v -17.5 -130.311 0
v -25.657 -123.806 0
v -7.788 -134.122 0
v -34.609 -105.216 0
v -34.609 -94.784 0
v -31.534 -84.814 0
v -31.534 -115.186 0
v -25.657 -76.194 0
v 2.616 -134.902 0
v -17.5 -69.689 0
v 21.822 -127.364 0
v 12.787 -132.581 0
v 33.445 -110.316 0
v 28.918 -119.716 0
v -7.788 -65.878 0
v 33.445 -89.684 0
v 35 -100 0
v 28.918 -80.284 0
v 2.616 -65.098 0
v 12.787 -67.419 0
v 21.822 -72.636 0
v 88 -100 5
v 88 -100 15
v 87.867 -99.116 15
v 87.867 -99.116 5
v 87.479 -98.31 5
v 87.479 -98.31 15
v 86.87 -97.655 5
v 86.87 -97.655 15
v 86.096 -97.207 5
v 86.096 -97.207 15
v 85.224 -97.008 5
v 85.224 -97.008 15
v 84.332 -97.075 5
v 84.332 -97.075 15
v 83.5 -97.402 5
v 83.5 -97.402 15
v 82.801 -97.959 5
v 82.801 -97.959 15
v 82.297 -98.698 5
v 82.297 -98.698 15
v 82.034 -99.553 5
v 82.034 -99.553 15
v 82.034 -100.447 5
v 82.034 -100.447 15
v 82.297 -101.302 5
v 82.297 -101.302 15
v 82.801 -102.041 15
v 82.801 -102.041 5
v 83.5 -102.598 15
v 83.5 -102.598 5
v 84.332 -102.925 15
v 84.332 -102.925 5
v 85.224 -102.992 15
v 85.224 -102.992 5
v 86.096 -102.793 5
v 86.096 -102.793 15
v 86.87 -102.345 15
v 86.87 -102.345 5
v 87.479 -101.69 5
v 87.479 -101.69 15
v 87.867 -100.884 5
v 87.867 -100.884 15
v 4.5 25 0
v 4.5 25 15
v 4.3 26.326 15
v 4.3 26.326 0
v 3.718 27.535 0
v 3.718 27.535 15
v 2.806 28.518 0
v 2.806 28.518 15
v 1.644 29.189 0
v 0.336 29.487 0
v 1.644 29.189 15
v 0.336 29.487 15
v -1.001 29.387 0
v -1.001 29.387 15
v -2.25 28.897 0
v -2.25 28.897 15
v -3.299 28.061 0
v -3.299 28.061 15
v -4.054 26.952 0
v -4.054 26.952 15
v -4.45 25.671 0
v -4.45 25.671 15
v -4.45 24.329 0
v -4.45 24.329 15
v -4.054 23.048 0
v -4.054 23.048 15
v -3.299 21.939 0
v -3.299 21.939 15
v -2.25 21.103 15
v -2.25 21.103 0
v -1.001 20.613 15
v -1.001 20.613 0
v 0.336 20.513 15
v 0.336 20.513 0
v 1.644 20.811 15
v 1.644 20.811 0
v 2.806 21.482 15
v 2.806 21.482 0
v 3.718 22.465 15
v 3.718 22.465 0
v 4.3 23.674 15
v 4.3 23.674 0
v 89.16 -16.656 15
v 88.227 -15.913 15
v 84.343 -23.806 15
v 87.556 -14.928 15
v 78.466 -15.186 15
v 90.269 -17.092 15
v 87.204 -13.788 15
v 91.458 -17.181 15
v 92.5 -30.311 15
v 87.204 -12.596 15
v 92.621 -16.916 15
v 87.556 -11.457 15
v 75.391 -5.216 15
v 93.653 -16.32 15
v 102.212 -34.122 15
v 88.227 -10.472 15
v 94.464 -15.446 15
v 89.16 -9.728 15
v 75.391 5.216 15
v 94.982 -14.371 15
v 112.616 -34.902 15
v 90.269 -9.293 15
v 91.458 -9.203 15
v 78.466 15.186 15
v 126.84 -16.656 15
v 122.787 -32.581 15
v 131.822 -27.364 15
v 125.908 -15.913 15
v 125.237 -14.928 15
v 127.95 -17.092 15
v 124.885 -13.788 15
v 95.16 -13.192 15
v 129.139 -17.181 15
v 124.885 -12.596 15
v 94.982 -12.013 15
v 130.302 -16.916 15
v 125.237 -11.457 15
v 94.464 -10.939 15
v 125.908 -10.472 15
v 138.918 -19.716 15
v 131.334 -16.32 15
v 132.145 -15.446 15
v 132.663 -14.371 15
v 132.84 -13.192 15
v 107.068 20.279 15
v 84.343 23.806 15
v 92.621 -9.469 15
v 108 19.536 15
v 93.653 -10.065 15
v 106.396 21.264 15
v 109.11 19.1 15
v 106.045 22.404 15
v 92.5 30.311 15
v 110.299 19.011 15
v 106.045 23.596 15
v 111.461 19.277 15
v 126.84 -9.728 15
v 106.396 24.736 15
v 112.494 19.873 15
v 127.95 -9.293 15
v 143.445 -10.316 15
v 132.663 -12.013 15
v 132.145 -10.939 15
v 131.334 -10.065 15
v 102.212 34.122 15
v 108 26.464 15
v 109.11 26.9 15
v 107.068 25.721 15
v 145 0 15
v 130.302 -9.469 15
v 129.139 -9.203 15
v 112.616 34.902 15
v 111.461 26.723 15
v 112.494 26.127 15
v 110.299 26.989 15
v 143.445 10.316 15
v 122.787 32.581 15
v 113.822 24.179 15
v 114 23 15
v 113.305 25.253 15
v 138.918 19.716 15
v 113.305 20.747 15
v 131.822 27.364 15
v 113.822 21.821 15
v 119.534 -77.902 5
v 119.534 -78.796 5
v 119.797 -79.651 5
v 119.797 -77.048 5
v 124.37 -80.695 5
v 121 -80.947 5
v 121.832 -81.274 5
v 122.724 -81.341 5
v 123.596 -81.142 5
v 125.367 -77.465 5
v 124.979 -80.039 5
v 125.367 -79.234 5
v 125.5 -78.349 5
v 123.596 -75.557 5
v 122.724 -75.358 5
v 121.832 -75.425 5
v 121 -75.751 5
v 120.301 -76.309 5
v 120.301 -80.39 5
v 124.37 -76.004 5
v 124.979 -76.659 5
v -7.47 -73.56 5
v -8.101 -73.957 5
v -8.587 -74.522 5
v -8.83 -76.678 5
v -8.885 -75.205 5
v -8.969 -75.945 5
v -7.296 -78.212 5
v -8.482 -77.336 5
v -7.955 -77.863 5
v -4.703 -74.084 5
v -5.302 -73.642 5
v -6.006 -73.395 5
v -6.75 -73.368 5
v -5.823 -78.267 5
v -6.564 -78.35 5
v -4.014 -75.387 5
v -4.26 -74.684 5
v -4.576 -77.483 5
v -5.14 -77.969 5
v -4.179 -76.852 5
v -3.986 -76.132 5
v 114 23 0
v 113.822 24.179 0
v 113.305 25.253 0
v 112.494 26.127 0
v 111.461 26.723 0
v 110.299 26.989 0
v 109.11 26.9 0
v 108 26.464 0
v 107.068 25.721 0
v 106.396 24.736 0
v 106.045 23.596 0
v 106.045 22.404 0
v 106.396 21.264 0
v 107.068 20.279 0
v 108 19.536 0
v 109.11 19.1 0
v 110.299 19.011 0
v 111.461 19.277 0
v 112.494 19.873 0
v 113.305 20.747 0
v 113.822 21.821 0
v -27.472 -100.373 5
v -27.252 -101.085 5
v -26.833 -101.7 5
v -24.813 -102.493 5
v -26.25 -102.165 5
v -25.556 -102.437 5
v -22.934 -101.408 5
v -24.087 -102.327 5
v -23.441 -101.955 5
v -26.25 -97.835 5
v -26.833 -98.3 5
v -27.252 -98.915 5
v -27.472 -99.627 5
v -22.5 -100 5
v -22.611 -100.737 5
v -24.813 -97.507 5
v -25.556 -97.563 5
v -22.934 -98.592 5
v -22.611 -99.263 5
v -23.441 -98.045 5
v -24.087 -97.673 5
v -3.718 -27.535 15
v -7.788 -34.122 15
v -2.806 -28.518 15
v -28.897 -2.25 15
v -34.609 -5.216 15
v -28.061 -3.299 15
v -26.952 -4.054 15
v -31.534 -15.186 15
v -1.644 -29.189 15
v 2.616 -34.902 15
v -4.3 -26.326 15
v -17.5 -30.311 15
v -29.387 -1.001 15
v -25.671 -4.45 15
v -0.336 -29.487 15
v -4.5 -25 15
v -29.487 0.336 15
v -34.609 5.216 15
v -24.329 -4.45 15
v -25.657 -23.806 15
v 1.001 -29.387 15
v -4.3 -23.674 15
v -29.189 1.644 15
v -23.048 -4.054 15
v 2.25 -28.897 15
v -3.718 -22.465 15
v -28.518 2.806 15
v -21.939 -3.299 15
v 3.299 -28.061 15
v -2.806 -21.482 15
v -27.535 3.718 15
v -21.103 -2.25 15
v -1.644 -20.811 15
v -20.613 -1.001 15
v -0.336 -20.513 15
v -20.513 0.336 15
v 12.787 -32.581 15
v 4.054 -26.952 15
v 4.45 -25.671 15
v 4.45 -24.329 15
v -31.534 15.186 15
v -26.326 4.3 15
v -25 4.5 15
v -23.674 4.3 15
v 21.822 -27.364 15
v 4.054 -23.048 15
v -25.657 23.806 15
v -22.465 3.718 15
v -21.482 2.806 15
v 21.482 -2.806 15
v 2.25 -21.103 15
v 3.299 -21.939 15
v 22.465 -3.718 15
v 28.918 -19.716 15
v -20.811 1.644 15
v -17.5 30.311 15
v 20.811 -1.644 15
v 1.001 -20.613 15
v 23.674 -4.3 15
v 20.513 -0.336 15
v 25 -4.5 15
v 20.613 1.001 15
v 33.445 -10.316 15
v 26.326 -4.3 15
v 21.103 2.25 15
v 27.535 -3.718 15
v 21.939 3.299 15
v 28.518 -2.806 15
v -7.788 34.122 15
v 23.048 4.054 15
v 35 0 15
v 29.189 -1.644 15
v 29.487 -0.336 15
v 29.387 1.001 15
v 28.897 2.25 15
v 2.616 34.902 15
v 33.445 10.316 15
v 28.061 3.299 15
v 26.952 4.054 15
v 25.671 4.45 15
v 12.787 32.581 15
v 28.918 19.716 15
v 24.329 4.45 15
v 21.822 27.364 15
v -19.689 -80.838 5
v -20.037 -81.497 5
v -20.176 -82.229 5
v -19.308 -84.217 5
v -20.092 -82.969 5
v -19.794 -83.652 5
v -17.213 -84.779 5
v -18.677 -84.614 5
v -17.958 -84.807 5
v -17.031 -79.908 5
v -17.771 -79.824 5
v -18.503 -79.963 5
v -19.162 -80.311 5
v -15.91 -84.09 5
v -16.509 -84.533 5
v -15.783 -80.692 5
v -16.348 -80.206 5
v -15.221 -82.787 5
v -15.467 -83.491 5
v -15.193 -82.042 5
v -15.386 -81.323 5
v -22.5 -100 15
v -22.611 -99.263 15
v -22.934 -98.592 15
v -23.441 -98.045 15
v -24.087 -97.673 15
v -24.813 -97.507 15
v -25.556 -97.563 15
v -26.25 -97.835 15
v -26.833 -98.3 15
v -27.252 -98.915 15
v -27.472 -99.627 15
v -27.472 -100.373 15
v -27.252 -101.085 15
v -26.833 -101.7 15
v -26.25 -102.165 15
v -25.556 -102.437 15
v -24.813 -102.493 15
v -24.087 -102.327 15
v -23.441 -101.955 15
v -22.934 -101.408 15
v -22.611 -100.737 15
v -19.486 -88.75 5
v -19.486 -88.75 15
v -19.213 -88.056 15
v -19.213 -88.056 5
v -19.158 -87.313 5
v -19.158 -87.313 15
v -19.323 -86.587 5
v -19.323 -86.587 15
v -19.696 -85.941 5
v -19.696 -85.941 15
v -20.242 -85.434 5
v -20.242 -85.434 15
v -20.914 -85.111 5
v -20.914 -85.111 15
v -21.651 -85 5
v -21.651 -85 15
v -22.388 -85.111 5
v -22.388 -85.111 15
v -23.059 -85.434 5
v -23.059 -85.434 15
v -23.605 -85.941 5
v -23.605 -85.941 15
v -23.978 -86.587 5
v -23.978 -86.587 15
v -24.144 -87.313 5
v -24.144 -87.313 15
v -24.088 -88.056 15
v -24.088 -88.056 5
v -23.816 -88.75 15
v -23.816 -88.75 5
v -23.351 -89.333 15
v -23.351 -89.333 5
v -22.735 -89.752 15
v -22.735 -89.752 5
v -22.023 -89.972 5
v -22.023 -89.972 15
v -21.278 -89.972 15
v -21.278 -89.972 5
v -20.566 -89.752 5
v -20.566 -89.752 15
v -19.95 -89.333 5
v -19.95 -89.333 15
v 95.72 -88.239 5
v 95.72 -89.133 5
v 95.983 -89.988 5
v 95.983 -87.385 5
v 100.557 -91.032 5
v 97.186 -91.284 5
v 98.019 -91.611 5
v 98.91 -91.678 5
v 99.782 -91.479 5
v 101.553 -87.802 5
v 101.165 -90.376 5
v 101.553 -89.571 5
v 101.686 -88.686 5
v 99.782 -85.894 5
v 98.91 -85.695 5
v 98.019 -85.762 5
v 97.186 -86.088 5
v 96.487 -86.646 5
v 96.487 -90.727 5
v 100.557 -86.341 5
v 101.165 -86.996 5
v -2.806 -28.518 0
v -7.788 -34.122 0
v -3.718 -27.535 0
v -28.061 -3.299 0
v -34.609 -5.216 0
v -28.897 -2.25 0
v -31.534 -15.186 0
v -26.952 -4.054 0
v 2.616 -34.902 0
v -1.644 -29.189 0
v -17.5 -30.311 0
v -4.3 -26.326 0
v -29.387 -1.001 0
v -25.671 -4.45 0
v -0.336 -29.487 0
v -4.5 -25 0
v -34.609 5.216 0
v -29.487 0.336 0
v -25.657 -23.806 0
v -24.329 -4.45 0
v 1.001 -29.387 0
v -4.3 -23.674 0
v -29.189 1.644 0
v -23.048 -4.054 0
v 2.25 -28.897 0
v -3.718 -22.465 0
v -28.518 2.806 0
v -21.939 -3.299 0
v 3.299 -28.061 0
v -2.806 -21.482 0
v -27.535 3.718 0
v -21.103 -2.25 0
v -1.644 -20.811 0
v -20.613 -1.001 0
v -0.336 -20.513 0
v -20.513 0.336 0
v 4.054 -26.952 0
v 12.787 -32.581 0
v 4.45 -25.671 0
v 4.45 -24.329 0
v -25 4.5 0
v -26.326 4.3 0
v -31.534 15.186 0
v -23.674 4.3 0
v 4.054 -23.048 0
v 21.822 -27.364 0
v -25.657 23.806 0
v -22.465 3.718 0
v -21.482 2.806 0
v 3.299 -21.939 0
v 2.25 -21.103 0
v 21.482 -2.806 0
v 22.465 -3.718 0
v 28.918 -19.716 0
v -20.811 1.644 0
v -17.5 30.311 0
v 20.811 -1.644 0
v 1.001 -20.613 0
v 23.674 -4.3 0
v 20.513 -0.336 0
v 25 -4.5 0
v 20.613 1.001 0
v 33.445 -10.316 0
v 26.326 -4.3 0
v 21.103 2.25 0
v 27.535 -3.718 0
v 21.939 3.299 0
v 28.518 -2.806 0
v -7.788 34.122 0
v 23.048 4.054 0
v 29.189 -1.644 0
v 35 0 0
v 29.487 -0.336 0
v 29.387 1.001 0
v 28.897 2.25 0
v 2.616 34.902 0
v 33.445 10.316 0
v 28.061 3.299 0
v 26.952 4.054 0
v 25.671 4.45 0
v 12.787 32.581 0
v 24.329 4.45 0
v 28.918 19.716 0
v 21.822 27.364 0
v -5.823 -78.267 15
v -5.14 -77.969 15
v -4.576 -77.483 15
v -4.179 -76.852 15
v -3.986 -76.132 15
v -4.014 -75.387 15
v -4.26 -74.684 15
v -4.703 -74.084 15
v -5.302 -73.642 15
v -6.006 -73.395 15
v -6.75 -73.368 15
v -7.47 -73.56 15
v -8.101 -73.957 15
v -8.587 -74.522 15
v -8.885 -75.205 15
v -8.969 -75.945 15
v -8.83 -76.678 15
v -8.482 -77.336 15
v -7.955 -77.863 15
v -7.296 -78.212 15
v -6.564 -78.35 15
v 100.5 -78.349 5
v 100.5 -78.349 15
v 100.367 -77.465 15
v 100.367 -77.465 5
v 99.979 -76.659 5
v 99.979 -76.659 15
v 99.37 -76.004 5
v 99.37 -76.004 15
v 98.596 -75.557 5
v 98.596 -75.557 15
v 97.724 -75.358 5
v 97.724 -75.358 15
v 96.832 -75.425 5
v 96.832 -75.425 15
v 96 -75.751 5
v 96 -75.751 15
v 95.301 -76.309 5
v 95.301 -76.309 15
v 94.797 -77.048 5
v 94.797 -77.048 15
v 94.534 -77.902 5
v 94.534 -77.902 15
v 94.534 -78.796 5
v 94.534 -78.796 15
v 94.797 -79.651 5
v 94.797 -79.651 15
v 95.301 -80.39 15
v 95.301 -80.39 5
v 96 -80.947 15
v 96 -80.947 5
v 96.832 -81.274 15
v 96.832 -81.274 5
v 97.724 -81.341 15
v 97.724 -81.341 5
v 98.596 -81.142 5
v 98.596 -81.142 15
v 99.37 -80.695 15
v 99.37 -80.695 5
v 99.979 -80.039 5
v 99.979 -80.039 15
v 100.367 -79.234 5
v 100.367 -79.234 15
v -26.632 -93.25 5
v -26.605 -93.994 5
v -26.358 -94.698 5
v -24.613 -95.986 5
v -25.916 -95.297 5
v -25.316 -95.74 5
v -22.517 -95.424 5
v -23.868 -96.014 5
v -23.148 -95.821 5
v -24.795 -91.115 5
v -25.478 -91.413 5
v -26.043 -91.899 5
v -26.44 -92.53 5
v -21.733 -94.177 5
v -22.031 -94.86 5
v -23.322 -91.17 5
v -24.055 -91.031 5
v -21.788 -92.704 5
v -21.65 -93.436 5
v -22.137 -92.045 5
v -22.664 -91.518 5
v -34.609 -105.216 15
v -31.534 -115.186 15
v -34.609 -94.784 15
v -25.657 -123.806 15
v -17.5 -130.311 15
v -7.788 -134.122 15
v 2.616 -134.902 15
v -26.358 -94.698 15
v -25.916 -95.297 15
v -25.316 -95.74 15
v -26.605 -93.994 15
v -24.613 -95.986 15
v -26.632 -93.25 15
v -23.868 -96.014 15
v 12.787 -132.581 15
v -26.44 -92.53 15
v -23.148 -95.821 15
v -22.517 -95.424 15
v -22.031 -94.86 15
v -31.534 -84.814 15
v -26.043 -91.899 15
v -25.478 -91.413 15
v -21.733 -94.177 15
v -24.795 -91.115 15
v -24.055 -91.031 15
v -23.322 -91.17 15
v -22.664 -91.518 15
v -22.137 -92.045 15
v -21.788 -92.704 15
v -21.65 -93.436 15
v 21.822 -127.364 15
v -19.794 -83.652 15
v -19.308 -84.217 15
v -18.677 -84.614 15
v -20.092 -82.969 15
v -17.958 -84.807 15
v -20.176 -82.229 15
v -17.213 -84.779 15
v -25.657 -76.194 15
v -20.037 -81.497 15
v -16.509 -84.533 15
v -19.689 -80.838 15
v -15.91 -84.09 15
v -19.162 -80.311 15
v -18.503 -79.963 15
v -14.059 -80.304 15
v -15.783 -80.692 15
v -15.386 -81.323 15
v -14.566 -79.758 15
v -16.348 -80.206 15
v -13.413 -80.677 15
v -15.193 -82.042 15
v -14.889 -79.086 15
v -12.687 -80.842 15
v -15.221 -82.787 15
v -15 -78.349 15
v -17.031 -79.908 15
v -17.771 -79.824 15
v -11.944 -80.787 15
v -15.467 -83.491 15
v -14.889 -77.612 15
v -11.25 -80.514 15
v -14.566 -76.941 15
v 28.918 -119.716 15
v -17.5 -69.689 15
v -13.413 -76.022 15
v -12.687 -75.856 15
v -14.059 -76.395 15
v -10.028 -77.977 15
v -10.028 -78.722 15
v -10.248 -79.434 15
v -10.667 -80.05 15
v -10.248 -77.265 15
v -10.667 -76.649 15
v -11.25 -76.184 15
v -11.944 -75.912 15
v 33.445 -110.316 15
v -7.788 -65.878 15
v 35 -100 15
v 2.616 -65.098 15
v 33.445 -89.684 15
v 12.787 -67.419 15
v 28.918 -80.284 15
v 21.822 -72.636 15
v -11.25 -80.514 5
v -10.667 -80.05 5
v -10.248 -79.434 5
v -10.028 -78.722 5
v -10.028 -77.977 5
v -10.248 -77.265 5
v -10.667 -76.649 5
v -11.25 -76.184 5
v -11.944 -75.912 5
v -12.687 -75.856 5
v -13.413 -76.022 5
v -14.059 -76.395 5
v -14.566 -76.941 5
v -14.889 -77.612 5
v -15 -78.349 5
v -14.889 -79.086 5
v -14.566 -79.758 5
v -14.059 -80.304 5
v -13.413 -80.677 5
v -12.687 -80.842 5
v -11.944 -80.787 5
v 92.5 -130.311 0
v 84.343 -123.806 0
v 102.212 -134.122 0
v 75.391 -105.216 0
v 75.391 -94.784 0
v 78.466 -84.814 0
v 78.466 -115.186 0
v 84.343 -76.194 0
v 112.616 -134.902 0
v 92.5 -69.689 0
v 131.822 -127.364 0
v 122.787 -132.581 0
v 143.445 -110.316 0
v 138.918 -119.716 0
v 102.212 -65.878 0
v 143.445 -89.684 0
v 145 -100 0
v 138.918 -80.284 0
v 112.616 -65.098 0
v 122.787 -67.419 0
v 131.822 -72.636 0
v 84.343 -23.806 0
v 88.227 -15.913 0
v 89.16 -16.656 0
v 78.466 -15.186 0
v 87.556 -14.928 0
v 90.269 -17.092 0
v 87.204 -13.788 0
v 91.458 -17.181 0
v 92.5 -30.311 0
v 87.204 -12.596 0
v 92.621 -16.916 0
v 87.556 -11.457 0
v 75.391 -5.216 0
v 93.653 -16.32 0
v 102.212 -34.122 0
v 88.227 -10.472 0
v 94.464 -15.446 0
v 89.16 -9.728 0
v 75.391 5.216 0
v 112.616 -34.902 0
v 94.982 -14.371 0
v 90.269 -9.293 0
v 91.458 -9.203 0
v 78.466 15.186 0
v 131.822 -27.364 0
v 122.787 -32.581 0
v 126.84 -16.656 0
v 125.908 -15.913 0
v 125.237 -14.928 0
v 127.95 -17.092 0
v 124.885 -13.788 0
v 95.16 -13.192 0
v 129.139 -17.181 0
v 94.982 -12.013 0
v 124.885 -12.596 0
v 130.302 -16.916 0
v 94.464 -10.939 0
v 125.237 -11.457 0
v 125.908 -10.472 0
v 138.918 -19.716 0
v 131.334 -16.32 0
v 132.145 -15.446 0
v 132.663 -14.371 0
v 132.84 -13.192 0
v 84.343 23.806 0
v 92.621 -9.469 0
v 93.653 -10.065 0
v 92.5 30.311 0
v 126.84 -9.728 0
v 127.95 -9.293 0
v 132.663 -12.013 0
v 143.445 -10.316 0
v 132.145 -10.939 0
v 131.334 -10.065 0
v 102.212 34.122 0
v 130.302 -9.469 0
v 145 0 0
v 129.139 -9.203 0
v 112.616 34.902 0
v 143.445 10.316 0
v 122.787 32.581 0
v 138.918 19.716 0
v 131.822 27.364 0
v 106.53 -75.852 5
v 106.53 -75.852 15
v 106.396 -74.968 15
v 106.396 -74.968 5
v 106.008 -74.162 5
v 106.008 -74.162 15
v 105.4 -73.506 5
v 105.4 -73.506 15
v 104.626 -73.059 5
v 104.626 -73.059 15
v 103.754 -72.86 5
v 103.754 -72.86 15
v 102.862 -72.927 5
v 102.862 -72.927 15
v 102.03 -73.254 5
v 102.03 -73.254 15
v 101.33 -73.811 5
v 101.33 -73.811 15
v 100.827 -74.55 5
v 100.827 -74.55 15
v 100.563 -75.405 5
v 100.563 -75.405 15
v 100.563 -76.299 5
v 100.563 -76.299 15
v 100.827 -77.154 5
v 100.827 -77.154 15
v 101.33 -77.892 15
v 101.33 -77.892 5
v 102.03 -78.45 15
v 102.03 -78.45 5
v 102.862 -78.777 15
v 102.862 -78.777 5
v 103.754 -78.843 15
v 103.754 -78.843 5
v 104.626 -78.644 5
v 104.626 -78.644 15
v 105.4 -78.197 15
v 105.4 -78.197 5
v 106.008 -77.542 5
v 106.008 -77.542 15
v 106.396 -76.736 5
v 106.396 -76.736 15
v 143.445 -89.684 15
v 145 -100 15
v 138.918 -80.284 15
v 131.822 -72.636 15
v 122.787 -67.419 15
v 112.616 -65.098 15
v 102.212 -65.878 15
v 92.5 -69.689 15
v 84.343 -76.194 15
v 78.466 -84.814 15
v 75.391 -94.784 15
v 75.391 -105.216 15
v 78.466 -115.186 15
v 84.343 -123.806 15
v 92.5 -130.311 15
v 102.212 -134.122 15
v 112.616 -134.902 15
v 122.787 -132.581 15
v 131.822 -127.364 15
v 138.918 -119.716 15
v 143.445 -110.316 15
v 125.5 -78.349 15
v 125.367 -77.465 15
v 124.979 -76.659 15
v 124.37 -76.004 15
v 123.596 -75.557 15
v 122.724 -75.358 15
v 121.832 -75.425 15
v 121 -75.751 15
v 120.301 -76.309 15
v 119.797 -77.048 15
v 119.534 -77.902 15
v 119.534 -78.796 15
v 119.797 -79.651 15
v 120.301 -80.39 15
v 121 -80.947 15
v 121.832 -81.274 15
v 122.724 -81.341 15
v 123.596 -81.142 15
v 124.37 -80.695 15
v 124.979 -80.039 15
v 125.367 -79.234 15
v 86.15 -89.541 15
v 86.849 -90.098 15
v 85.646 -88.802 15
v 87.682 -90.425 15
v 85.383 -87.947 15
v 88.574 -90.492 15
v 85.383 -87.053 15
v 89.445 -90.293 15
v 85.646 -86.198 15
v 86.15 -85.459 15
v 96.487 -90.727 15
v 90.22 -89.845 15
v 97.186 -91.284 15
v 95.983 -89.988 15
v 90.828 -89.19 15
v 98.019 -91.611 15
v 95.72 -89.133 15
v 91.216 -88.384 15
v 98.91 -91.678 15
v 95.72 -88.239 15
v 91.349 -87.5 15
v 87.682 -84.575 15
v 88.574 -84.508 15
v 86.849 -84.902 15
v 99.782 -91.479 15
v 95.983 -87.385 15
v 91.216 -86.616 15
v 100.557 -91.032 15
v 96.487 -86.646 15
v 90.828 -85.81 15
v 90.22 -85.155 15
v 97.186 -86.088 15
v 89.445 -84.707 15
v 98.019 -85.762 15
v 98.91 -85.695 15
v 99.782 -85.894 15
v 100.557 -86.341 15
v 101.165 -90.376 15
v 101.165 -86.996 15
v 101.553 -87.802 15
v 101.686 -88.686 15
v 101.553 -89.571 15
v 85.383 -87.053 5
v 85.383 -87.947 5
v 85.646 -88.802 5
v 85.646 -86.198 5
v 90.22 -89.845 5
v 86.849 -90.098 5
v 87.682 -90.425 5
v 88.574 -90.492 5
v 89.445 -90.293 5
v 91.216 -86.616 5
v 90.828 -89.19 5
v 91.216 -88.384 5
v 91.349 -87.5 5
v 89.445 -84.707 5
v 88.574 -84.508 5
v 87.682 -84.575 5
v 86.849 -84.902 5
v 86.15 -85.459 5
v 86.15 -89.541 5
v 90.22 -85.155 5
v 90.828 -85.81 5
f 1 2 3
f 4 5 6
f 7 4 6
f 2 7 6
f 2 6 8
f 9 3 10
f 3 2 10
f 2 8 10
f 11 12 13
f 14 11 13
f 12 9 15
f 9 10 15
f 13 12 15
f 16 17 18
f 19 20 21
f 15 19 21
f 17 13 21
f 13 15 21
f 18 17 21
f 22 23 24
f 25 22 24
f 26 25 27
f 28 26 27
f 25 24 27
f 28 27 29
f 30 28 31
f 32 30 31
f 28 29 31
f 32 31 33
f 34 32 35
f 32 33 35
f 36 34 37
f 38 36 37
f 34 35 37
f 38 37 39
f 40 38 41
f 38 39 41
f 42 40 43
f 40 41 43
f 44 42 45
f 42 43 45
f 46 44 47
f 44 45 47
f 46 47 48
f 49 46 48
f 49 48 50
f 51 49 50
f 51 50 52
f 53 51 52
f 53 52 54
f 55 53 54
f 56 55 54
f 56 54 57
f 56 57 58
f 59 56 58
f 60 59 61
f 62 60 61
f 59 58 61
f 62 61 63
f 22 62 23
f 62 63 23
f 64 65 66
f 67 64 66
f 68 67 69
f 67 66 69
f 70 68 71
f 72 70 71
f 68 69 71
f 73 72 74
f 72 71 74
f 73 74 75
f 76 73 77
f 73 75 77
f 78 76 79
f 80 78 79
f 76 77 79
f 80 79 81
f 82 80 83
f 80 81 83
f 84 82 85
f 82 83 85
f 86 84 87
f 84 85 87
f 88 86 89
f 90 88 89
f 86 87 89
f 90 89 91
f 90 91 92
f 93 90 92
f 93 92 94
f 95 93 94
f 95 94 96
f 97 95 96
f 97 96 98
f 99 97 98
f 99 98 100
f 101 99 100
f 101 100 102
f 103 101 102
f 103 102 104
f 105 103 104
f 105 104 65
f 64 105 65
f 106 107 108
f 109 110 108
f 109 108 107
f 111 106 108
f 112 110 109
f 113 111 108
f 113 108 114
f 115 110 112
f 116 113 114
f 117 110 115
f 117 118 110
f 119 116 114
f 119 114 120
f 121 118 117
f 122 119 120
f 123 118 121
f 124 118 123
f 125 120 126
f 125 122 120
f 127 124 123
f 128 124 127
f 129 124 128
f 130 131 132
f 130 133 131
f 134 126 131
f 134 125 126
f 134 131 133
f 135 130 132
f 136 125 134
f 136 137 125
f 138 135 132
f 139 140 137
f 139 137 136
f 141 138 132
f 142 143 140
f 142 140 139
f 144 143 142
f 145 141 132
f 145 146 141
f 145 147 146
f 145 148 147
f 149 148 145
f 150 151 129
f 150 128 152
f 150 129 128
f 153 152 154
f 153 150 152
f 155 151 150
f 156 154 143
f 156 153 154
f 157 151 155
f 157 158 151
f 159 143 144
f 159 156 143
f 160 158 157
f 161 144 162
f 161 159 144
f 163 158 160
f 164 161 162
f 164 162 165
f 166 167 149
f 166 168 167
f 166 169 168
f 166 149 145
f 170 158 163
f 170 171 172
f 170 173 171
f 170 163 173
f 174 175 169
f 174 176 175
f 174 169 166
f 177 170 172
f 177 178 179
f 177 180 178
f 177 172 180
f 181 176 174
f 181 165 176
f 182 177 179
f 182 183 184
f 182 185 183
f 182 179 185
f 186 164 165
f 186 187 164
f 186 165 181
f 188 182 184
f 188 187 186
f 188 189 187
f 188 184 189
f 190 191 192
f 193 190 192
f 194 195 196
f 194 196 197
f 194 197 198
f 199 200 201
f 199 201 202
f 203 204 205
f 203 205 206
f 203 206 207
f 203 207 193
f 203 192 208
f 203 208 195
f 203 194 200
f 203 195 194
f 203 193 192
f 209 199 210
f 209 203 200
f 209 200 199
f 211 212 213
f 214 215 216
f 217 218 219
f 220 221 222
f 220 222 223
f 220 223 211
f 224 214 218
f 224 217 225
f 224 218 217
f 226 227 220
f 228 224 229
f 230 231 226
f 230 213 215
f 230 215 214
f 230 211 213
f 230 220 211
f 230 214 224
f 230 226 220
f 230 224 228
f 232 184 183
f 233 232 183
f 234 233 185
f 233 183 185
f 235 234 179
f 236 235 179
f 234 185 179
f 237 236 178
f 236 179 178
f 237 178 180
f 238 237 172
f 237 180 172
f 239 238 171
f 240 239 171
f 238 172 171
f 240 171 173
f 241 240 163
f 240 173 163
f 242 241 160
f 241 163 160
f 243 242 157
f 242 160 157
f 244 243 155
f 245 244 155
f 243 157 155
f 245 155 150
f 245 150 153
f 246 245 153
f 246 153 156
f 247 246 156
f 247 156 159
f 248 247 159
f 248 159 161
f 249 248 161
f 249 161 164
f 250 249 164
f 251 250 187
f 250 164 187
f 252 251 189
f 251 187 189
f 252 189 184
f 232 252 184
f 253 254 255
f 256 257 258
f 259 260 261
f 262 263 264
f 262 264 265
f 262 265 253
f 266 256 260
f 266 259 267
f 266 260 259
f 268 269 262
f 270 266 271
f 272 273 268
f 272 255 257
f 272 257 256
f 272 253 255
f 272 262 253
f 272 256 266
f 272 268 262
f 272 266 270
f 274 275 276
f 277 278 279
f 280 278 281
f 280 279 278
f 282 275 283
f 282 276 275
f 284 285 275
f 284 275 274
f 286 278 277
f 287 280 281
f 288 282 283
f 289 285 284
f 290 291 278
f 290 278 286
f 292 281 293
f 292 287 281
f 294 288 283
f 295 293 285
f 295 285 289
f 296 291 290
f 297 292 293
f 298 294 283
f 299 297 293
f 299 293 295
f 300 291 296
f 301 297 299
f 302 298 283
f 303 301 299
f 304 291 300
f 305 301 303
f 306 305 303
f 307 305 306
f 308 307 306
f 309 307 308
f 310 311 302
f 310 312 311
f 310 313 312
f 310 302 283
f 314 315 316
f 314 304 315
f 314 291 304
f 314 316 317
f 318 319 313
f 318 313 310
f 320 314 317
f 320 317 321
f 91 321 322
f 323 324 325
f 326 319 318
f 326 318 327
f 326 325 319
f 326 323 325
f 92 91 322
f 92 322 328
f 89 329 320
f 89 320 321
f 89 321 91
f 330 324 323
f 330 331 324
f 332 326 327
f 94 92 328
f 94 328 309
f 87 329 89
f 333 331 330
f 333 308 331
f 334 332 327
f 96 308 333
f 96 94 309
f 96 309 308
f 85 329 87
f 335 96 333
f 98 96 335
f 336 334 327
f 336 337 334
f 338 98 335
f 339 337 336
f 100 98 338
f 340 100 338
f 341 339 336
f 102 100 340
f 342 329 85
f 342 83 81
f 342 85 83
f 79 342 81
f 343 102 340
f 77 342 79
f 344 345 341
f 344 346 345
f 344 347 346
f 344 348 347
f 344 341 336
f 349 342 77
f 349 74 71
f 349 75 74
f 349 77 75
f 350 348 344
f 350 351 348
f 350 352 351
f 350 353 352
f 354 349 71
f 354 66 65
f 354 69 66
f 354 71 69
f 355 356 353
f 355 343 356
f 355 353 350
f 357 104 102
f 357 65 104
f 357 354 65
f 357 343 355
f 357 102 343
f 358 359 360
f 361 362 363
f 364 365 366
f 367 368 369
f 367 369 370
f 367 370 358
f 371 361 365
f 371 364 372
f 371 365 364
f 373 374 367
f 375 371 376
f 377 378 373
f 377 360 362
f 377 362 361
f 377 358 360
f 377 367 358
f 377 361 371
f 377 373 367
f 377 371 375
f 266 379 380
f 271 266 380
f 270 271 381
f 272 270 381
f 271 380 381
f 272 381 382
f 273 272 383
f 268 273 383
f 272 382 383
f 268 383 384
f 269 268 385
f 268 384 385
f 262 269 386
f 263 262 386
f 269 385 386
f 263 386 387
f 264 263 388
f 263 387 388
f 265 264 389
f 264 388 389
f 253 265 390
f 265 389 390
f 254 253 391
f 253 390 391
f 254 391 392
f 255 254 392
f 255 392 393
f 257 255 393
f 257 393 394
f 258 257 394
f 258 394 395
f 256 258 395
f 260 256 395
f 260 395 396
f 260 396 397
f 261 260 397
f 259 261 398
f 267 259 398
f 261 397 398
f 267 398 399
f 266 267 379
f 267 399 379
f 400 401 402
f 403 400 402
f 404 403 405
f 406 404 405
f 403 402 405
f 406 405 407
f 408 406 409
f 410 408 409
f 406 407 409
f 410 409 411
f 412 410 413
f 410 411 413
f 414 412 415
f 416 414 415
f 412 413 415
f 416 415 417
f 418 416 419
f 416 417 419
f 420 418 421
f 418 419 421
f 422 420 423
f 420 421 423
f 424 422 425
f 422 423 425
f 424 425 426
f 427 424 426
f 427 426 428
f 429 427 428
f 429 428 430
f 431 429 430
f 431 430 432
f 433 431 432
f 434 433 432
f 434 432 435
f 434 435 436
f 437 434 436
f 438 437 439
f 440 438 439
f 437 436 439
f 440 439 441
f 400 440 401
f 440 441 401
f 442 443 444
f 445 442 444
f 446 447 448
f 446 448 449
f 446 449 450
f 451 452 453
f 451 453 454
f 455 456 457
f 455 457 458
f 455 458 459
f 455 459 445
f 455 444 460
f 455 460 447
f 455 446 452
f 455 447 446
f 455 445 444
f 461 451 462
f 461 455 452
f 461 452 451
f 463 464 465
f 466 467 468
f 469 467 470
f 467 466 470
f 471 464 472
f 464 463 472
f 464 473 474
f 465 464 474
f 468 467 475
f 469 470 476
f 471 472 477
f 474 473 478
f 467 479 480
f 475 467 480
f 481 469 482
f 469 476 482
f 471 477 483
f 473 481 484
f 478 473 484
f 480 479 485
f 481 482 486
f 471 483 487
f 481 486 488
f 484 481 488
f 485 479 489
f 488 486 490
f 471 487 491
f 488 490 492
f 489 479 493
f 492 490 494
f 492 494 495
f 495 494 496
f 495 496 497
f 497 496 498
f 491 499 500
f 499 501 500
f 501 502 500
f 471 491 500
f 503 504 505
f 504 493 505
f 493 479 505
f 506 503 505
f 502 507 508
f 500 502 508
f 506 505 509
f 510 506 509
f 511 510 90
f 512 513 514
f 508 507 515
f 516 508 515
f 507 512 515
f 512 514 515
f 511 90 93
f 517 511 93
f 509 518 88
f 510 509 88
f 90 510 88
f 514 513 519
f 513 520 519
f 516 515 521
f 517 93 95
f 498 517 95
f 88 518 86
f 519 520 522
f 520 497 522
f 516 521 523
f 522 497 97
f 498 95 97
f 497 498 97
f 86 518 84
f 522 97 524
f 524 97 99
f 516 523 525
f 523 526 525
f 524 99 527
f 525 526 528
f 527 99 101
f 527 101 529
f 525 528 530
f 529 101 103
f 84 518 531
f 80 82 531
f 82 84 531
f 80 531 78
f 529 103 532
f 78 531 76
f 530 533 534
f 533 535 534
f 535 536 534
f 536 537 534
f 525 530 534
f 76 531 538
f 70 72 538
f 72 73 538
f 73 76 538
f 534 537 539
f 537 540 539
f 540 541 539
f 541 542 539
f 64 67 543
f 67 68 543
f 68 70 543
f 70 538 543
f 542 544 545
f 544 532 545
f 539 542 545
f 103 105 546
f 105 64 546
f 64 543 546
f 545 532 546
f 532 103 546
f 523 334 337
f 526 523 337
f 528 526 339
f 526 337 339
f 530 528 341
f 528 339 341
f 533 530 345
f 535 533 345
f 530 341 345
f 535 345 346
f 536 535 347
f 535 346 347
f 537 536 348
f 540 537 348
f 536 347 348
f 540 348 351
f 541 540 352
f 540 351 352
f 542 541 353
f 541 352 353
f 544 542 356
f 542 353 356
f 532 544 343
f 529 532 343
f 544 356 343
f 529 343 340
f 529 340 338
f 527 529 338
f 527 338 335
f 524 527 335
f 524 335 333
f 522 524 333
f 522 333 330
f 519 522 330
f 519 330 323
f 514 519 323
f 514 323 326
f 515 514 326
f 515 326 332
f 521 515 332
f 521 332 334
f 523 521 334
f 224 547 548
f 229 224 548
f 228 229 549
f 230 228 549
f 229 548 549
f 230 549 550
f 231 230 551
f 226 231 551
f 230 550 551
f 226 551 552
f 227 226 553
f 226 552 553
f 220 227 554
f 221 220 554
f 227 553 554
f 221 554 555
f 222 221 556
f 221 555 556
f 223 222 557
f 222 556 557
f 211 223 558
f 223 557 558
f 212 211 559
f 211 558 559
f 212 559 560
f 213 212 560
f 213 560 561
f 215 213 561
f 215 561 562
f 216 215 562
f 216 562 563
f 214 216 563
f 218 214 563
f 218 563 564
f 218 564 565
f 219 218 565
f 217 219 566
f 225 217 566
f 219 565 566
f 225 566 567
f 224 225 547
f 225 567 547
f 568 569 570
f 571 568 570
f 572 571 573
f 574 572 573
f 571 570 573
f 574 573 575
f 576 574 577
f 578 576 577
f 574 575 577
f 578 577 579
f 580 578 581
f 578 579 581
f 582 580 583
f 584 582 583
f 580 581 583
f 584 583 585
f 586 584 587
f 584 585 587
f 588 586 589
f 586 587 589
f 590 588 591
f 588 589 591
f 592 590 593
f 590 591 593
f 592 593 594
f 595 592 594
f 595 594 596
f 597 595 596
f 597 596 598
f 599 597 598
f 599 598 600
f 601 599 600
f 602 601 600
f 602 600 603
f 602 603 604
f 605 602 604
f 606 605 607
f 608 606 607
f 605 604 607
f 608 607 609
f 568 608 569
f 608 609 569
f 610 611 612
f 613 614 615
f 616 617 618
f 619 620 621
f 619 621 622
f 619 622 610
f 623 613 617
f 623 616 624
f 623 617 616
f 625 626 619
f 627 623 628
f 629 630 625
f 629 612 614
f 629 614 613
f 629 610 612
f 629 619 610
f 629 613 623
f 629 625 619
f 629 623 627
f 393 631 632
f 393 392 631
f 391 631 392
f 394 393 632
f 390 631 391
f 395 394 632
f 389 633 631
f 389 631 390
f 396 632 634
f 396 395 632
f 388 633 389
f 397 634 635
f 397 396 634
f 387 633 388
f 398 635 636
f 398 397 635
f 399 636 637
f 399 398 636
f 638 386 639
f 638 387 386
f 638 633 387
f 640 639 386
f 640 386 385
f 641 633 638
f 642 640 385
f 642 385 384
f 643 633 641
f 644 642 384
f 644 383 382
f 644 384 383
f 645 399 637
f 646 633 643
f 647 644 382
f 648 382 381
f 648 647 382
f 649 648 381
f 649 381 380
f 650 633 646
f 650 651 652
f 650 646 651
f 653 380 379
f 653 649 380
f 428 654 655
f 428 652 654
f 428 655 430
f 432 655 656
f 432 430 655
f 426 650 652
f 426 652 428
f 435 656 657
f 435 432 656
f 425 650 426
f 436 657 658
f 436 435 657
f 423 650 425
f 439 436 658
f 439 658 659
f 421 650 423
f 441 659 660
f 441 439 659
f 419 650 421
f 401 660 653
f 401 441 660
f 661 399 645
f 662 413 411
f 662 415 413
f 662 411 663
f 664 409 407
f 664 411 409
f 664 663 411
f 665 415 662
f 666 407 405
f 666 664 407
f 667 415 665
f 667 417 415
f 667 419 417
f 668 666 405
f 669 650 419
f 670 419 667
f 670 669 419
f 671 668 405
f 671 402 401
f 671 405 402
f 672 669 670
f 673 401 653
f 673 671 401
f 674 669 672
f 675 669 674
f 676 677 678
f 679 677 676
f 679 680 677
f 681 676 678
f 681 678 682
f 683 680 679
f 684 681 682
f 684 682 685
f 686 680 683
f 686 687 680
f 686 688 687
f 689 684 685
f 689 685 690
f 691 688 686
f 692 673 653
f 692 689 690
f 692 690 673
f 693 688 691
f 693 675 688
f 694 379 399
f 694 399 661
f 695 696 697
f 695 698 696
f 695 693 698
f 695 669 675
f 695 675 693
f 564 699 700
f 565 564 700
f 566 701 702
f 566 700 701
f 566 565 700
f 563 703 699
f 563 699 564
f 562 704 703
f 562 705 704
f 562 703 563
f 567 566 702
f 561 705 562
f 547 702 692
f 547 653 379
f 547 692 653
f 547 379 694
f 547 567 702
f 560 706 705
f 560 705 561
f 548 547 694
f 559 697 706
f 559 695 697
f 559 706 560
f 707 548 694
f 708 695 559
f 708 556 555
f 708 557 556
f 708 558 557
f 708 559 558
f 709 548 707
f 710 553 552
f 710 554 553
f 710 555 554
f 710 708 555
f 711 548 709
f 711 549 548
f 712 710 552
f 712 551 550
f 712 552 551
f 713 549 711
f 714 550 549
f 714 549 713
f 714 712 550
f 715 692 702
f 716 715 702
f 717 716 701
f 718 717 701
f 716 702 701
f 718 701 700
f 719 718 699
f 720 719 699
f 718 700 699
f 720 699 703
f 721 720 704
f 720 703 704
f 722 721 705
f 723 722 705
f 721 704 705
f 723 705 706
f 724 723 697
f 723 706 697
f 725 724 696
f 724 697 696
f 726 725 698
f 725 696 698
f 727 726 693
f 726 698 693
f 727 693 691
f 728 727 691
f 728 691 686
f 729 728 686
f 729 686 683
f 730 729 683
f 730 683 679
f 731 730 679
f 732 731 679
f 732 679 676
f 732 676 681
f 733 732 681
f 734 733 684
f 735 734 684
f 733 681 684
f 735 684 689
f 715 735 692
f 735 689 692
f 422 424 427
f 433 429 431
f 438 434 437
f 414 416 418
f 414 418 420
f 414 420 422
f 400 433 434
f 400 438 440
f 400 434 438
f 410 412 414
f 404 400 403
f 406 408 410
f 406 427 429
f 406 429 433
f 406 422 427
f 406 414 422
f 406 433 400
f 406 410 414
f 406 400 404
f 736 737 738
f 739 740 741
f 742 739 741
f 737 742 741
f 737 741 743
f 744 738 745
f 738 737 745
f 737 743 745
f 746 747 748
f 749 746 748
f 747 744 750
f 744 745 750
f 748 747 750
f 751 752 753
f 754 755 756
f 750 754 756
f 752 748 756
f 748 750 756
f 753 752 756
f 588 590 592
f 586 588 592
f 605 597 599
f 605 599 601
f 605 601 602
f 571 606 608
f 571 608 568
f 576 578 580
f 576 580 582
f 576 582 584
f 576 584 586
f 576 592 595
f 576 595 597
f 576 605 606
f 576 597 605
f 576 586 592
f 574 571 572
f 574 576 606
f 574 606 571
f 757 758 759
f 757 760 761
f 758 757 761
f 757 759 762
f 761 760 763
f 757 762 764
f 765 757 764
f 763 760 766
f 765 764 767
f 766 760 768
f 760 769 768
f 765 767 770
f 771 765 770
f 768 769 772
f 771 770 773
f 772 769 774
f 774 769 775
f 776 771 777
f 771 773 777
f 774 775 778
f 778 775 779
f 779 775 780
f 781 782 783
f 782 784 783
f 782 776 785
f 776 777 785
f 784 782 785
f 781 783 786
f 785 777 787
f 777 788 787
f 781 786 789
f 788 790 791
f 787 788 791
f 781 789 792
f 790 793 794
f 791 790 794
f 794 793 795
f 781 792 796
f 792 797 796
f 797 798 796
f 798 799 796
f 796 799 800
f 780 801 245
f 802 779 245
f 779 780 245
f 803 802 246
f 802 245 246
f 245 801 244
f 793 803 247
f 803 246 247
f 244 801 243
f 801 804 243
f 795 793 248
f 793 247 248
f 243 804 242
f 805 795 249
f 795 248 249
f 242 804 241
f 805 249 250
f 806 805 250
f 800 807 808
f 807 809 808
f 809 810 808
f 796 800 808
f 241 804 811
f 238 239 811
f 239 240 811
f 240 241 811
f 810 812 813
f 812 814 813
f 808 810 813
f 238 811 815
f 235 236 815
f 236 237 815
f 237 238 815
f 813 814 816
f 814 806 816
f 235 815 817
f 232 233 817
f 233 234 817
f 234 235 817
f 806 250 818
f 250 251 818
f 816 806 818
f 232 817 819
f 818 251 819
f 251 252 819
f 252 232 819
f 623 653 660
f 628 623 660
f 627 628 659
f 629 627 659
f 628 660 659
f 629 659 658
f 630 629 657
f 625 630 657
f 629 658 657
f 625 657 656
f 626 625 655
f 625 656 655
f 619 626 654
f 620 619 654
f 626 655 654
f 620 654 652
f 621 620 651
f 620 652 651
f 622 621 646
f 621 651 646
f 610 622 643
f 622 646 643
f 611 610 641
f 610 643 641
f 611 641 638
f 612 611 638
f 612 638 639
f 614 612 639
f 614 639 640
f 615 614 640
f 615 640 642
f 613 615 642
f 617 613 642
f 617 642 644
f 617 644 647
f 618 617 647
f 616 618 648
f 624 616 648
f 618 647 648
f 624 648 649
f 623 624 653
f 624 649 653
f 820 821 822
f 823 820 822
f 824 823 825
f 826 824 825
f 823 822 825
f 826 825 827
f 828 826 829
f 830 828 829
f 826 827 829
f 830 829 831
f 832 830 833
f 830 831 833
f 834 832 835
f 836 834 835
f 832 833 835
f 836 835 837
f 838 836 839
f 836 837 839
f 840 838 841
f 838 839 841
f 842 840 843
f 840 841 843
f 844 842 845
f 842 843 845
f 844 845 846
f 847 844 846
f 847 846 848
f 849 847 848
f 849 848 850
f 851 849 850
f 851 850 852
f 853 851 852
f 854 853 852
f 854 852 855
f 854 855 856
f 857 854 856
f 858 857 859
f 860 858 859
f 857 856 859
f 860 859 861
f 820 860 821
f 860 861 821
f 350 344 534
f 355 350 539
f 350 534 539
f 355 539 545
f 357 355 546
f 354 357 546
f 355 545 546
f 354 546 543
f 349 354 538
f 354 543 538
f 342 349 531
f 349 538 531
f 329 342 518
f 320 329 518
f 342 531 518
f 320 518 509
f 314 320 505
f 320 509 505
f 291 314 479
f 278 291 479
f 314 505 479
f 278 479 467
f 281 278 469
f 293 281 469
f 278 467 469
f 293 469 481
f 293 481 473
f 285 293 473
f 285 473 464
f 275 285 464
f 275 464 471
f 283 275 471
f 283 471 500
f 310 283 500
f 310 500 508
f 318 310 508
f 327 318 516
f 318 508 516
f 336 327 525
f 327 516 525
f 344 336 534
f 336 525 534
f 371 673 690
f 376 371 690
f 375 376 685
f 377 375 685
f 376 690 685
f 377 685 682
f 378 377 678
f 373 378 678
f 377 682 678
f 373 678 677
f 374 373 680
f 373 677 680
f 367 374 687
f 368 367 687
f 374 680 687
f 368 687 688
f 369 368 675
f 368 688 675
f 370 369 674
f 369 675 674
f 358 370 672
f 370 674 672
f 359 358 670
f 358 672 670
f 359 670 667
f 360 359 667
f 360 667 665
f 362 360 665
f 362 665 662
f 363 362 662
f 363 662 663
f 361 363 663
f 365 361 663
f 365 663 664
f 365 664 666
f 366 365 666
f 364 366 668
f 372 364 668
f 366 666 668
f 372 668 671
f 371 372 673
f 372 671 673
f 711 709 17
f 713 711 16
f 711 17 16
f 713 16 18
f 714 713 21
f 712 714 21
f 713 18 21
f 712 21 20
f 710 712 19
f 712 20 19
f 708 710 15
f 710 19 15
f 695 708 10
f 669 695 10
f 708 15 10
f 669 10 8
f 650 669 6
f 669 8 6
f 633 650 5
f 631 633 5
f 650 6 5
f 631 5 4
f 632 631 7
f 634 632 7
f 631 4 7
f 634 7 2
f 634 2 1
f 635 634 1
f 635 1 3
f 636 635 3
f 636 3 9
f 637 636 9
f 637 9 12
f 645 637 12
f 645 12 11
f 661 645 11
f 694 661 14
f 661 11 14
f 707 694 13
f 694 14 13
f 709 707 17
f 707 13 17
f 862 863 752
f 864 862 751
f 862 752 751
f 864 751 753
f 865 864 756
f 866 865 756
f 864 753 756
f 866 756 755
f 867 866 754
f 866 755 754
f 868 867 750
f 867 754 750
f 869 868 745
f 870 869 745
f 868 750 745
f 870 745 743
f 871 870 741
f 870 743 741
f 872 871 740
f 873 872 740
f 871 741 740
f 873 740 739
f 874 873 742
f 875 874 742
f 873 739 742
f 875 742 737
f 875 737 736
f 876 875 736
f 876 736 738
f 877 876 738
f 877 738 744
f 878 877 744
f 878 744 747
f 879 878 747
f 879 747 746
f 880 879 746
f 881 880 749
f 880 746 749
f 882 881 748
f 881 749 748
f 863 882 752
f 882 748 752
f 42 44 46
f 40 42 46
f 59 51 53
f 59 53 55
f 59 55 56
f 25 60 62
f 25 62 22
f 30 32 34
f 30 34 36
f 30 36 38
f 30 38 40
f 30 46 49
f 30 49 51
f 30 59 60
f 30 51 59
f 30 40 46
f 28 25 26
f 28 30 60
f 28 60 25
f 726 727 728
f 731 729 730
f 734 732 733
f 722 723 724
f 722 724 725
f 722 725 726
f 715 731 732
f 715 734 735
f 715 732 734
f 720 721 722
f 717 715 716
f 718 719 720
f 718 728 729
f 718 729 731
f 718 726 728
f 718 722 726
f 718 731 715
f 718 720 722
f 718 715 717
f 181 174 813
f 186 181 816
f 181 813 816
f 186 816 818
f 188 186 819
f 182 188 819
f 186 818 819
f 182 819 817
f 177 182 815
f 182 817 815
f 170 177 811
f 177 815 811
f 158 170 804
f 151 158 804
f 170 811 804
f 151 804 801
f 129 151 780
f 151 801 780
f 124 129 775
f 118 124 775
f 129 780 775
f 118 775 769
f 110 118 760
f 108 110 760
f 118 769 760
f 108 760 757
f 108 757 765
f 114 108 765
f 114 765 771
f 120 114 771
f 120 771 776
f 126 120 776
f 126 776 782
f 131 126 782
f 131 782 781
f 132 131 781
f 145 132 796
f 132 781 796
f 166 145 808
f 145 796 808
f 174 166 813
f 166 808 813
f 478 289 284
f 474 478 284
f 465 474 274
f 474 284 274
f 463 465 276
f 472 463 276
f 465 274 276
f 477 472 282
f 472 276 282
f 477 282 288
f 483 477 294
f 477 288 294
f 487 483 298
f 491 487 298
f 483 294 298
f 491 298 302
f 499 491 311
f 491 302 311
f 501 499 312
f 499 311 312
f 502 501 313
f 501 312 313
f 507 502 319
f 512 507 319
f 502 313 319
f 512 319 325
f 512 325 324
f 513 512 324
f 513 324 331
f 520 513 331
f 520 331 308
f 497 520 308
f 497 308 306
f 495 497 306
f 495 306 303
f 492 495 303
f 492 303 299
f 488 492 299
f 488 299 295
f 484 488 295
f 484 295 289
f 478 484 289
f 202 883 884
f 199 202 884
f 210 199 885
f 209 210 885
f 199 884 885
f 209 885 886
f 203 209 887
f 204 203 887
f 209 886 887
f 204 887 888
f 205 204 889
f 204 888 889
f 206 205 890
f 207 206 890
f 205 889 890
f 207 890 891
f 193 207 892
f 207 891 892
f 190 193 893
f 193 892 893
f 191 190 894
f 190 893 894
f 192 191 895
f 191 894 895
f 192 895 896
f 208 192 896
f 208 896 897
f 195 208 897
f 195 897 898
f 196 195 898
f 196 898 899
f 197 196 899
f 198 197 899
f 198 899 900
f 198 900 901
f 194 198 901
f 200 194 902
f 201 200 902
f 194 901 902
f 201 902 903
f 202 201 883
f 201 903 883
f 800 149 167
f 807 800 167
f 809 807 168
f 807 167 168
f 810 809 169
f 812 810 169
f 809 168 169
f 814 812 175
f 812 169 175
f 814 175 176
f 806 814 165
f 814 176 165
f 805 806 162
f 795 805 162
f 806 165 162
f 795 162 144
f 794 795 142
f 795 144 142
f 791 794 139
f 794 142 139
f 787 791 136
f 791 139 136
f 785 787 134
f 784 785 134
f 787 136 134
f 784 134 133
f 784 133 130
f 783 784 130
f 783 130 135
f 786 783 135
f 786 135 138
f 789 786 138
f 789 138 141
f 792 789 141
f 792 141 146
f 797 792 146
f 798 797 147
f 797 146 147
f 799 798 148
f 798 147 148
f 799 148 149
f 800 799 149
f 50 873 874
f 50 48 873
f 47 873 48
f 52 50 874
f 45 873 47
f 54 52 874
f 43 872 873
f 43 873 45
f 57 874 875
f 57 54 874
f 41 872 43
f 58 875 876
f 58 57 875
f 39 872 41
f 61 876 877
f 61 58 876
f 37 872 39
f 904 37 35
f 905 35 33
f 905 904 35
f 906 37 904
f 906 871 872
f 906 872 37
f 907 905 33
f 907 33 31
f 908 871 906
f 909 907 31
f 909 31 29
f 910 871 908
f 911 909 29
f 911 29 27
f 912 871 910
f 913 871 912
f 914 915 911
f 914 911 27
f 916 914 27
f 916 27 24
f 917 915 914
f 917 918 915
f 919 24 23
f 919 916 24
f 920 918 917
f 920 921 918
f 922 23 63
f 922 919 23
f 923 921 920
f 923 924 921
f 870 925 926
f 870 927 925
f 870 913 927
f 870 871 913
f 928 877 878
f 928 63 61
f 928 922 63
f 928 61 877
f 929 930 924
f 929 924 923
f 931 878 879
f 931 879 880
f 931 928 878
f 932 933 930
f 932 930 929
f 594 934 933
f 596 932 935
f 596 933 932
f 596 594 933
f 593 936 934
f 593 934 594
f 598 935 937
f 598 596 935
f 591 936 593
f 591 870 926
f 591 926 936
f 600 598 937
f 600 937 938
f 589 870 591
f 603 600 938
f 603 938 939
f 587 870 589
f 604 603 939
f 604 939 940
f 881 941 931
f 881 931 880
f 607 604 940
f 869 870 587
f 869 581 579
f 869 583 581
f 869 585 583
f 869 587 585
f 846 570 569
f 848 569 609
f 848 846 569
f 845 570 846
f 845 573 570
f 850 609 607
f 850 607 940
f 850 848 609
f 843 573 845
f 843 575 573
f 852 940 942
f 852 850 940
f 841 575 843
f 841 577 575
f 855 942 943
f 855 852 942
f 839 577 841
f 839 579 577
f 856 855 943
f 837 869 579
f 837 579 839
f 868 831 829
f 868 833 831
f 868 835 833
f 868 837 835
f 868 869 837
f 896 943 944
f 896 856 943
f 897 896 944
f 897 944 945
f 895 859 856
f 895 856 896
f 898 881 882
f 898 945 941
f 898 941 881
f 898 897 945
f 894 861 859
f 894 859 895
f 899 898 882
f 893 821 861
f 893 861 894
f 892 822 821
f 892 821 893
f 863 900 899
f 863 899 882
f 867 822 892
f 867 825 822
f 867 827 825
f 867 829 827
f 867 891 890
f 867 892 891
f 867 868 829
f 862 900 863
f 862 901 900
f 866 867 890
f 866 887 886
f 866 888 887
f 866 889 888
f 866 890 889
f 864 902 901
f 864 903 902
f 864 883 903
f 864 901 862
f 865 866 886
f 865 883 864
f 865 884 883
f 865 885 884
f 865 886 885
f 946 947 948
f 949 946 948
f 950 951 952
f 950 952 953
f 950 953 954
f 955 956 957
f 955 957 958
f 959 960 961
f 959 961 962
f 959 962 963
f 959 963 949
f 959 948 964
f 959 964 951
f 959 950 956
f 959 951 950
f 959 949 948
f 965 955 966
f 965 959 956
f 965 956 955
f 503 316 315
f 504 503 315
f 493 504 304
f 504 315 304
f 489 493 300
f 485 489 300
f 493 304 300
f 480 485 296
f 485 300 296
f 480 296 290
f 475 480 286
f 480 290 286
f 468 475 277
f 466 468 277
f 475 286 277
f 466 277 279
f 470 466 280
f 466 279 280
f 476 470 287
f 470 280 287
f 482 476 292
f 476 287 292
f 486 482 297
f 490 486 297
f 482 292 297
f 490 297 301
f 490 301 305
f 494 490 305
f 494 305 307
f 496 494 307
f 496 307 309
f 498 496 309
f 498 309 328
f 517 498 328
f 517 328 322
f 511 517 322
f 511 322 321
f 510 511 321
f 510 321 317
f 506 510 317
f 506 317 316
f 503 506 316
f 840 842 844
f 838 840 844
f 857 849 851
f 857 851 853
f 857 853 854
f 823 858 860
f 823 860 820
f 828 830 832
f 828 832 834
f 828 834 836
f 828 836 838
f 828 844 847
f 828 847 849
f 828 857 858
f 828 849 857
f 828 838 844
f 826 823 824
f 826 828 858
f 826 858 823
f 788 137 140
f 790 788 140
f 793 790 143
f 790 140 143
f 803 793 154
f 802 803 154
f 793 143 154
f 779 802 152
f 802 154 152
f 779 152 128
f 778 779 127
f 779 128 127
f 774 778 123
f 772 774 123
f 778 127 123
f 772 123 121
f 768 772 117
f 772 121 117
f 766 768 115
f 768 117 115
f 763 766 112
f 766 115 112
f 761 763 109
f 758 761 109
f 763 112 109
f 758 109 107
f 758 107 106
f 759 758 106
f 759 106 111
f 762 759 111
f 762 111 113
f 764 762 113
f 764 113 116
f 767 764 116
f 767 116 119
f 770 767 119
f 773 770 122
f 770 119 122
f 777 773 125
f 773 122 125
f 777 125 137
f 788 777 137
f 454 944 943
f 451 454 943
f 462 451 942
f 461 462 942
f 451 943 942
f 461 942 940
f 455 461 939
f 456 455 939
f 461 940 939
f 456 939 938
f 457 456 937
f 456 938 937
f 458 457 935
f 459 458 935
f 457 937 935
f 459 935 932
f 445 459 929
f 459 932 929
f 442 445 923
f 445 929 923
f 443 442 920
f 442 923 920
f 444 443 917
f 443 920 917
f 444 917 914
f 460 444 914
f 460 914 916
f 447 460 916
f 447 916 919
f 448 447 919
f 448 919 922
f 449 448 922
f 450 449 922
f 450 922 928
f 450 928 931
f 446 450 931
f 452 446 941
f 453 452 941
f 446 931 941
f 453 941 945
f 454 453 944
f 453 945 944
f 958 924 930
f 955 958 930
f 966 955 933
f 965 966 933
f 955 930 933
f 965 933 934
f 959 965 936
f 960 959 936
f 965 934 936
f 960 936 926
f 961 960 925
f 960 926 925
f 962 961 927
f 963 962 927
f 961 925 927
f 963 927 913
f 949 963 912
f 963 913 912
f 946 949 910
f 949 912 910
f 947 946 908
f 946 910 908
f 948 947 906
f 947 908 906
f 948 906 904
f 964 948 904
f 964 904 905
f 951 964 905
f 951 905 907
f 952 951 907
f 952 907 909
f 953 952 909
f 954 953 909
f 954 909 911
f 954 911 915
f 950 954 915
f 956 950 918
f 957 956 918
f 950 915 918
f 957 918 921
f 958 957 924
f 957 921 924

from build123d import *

# Parameters (mm, degrees)
SKETCH_1_R               = 35
EXTRUDE_1_DEPTH          = 15
SKETCH_2_R               = 4.5
CUT_EXTRUDE_1_DEPTH      = 52.720402164
PATTERN_CIRCULAR_1_COUNT = 4
SKETCH_3_R               = 35
EXTRUDE_2_DEPTH          = 15
SKETCH_4_R               = 4
CUT_EXTRUDE_2_DEPTH      = 15
SKETCH_5_R               = 35
EXTRUDE_3_DEPTH          = 15
SKETCH_6_R               = 2.5
CUT_EXTRUDE_3_DEPTH      = 10
PATTERN_CIRCULAR_2_COUNT = 6
PATTERN_CIRCULAR_2_ANGLE = 75
SKETCH_7_R               = 35
EXTRUDE_4_DEPTH          = 15
SKETCH_8_R               = 3
CUT_EXTRUDE_4_DEPTH      = 10


with BuildPart() as part:
    # Эскиз1 → Бобышка-Вытянуть1 (new body)
    with BuildSketch(Plane.XY):
        Circle(SKETCH_1_R)
    extrude(amount=EXTRUDE_1_DEPTH)

    # Эскиз2 → Вырез-Вытянуть1 (cut, through all)
    with BuildSketch(Plane.XY.offset(15)):
        with Locations((0, 25)):
            Circle(SKETCH_2_R)
    cut_extrude_1 = extrude(amount=-CUT_EXTRUDE_1_DEPTH, mode=Mode.SUBTRACT)

    # Круговой массив1: Вырез-Вытянуть1 ×4 about axis
    pattern_circular_1_axis = Axis((0, 0, 0), (0, 0, 1))
    for i in range(1, PATTERN_CIRCULAR_1_COUNT):
        add(cut_extrude_1.rotate(pattern_circular_1_axis, i * 360 / PATTERN_CIRCULAR_1_COUNT), mode=Mode.SUBTRACT)


with BuildPart() as body_2:
    # Эскиз3 → Бобышка-Вытянуть2 (new body)
    with BuildSketch(Plane.XY):
        with Locations((110, 0)):
            Circle(SKETCH_3_R)
    extrude(amount=EXTRUDE_2_DEPTH)

    # Эскиз4 → Вырез-Вытянуть2 (cut)
    with BuildSketch(Plane.XY.offset(15)):
        with Locations((110, 23)):
            Circle(SKETCH_4_R)
        with Locations((128.840497019, -13.192258036)):
            Circle(SKETCH_4_R)
        with Locations((91.159502981, -13.192258036)):
            Circle(SKETCH_4_R)
    extrude(amount=-CUT_EXTRUDE_2_DEPTH, mode=Mode.SUBTRACT)


with BuildPart() as body_3:
    # Эскиз5 → Бобышка-Вытянуть3 (new body)
    with BuildSketch(Plane.XY):
        with Locations((0, -100)):
            Circle(SKETCH_5_R)
    extrude(amount=EXTRUDE_3_DEPTH)

    # Эскиз6 → Вырез-Вытянуть3 (cut)
    with BuildSketch(Plane.XY.offset(15)):
        with Locations((-25, -100)):
            Circle(SKETCH_6_R)
    cut_extrude_3 = extrude(amount=-CUT_EXTRUDE_3_DEPTH, mode=Mode.SUBTRACT)

    # Круговой массив2: Вырез-Вытянуть3 ×6 about axis
    pattern_circular_2_axis = Axis((0, -100, 0), (0, 0, -1))
    for i in range(1, PATTERN_CIRCULAR_2_COUNT):
        add(cut_extrude_3.rotate(pattern_circular_2_axis, i * PATTERN_CIRCULAR_2_ANGLE / (PATTERN_CIRCULAR_2_COUNT - 1)), mode=Mode.SUBTRACT)


with BuildPart() as body_4:
    # Эскиз7 → Бобышка-Вытянуть4 (new body)
    with BuildSketch(Plane.XY):
        with Locations((110, -100)):
            Circle(SKETCH_7_R)
    extrude(amount=EXTRUDE_4_DEPTH)

    # Эскиз8 → Вырез-Вытянуть4 (cut)
    with BuildSketch(Plane.XY.offset(15)):
        with Locations((85, -100)):
            Circle(SKETCH_8_R)
        with Locations((88.349364905, -87.5)):
            Circle(SKETCH_8_R)
        with Locations((97.5, -78.349364905)):
            Circle(SKETCH_8_R)
        with Locations((103.529523872, -75.851854343)):
            Circle(SKETCH_8_R)
        with Locations((98.686291501, -88.686291501)):
            Circle(SKETCH_8_R)
        with Locations((122.5, -78.349364905)):
            Circle(SKETCH_8_R)
    extrude(amount=-CUT_EXTRUDE_4_DEPTH, mode=Mode.SUBTRACT)


solid = Compound([part.part, body_2.part, body_3.part, body_4.part])
